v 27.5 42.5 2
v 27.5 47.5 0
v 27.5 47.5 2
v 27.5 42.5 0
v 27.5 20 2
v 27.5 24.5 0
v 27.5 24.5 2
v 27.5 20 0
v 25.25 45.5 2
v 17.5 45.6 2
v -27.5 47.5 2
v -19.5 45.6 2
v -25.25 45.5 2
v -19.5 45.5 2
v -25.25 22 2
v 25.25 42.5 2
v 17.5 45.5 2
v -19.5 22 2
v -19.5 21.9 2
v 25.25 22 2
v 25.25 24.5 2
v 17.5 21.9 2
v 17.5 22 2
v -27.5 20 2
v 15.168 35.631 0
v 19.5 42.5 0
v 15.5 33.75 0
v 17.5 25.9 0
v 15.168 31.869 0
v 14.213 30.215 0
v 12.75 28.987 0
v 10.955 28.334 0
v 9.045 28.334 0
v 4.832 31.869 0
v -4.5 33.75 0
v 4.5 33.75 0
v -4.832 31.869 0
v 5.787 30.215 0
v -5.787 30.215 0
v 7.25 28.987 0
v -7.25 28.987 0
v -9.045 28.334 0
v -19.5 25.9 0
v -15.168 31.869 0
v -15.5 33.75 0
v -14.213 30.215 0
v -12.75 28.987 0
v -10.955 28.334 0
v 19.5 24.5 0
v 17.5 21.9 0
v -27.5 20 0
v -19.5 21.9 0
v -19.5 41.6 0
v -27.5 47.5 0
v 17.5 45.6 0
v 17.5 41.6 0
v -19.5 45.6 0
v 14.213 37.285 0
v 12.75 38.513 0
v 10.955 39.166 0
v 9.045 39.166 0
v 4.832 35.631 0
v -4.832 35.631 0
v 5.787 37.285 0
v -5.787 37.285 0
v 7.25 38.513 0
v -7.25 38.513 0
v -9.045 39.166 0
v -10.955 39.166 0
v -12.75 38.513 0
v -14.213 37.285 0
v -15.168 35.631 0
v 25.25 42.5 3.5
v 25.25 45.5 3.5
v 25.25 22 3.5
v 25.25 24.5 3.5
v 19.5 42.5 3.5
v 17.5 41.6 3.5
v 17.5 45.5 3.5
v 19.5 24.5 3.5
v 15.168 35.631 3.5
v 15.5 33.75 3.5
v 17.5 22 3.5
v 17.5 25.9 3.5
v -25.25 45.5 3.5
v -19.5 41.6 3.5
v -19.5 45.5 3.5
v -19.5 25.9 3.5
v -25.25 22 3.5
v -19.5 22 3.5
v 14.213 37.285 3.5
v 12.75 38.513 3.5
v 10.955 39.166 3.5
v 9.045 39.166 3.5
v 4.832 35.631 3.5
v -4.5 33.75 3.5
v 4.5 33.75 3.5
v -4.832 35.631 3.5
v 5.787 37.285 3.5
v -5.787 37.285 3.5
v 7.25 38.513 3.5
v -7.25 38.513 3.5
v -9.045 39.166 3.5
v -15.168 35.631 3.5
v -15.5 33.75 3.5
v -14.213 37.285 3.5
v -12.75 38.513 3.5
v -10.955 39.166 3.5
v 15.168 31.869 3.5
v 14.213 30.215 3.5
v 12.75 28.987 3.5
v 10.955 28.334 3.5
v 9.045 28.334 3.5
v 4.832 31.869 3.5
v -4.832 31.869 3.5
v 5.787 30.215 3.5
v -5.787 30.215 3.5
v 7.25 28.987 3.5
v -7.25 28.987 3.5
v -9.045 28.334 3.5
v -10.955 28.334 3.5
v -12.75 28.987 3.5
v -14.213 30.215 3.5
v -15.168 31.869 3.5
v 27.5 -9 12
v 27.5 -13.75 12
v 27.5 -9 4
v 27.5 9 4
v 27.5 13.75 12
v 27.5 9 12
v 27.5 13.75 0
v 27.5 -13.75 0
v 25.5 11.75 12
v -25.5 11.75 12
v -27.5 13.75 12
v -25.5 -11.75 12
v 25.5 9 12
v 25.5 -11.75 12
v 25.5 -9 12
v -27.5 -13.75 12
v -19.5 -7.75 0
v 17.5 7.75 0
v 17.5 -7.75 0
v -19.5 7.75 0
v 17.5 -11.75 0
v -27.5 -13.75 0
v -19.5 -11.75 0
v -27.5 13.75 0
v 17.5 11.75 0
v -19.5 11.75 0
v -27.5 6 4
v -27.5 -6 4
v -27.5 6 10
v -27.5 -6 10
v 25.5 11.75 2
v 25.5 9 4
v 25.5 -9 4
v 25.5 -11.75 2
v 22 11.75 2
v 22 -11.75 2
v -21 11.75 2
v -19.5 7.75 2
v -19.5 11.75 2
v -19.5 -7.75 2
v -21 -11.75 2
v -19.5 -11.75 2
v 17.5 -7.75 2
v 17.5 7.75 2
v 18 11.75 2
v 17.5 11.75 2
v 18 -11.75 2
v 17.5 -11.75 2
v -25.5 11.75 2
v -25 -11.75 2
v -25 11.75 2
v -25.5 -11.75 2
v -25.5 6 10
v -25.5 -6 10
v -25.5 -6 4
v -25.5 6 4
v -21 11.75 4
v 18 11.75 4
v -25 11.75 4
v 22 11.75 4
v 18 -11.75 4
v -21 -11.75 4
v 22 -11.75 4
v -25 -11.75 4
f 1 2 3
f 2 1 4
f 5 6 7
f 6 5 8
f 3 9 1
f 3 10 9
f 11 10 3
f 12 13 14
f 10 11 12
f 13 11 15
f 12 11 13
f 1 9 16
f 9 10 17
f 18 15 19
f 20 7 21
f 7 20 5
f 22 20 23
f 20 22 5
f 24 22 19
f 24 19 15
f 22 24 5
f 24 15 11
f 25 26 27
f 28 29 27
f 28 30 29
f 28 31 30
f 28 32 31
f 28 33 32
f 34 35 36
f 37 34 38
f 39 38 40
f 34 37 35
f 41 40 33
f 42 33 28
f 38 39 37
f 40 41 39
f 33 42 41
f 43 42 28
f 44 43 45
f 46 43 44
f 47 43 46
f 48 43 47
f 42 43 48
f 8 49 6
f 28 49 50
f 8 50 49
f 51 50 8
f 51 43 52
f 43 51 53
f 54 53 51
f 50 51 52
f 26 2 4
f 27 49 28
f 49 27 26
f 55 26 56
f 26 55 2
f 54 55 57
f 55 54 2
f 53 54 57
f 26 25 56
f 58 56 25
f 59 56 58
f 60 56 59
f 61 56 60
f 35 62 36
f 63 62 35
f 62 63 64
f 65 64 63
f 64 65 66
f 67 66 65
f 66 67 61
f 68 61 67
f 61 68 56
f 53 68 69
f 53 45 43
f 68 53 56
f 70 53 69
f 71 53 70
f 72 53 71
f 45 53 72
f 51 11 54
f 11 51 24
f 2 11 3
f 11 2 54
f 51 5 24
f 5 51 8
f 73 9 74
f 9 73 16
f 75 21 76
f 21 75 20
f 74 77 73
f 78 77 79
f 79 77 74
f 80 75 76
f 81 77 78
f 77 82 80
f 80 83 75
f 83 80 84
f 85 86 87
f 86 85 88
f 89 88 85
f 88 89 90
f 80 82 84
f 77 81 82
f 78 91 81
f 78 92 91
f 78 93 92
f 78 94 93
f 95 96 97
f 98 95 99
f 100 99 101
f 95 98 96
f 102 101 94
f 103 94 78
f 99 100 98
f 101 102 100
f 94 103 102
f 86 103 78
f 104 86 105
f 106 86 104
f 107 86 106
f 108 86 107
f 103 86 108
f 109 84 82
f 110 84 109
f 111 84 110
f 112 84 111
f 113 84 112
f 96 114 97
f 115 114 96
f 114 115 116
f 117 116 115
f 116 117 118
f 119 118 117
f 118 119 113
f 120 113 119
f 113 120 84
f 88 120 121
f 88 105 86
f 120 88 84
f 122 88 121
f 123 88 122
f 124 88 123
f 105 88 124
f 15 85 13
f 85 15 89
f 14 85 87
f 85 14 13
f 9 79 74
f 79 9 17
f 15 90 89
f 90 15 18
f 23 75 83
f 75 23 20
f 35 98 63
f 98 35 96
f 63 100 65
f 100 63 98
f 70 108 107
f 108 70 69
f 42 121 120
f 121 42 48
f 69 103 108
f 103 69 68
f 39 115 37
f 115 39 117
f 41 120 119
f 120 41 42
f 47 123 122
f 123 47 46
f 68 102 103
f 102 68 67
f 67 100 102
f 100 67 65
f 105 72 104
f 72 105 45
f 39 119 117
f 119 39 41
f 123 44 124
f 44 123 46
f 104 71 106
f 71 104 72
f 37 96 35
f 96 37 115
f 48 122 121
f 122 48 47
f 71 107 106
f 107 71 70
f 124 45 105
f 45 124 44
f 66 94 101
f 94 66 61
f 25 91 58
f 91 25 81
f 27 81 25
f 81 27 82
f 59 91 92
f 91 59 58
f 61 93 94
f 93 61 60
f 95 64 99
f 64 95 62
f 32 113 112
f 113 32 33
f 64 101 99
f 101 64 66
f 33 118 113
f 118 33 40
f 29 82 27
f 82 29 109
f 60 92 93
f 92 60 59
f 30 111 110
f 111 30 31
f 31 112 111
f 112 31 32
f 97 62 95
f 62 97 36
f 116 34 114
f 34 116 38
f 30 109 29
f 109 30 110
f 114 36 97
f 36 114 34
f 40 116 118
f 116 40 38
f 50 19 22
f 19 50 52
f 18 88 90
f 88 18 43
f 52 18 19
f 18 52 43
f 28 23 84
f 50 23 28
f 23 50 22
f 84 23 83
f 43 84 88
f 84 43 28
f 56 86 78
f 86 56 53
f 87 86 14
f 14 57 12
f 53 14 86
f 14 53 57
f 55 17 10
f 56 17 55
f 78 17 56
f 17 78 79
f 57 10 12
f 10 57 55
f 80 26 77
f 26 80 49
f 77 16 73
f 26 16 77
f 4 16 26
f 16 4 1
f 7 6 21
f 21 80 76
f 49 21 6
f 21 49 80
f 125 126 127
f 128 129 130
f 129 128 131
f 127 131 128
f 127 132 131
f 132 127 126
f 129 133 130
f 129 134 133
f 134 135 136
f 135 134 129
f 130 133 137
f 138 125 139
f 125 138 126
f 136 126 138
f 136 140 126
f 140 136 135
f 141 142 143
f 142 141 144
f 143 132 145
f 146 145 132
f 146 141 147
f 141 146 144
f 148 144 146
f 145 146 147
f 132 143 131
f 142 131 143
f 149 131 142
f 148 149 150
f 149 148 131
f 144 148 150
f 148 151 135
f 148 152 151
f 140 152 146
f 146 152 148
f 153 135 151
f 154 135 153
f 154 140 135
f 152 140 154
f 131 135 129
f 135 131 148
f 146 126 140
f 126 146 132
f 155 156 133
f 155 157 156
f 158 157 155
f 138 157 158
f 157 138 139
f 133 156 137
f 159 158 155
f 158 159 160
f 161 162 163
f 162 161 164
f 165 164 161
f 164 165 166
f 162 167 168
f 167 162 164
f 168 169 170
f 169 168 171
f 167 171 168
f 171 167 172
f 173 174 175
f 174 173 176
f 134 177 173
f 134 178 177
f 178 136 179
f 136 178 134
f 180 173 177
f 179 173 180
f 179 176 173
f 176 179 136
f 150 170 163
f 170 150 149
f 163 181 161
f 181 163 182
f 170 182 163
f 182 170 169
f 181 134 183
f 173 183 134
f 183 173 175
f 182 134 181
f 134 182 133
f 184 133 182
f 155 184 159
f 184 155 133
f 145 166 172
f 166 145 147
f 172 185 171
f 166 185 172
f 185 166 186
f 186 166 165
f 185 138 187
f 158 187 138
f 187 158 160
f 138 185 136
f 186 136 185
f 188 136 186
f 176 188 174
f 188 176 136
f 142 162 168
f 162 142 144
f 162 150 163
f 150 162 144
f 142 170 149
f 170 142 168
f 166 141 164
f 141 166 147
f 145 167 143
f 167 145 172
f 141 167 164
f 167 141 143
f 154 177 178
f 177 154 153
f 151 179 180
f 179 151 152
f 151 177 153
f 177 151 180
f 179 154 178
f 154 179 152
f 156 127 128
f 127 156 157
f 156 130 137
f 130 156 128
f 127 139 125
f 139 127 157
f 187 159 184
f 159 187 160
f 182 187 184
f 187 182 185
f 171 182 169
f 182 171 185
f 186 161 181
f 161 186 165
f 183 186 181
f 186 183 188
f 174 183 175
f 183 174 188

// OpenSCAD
height = 12.0;

thickness = 2.0;
fudge = 0.1;

width = 38.5 + 16.5;
depth = 30.50 - 3.0;
 
cavity_width = width - (2 * thickness);
cavity_depth = depth - (2 * thickness);
cavity_height = height - thickness + fudge;

hole_diameter = 5.5;

slit_width = 4.0;
slit_height = 23.0 + 14.0;

// lid
difference() {
    union () {
        translate([-(width / 2.0), 20, 0.0]) cube([width, depth, 2.0]);
        translate([-(cavity_width / 2.0 - 0.25), 22, 2.0]) cube([cavity_width - 0.5, cavity_depth, 1.5]);            
    }
    translate([-10, 22 + (cavity_depth / 2), 2.5]) cylinder(h = 5 + fudge, r1 = hole_diameter, r2 =hole_diameter, center = true);
    translate([10, 22 + (cavity_depth / 2), 2.5]) cylinder(h = 5 + fudge, r1 = hole_diameter, r2 =hole_diameter, center = true);
    rotate([0, 0, 90]) translate([21.9, -17.5, 0]) cube([slit_width, slit_height, 10]);
    rotate([0, 0, 90]) translate([41.6, -17.5, 0]) cube([slit_width, slit_height, 10]);
    rotate([0, 0, 180]) translate([-27.5, -42.5, 0]) cube([8, 18, 10]);
}

// base
union() {
    translate([18, -(cavity_depth / 2.0), 2]) cube([4.0, cavity_depth, 2.0]);
    translate([-25, -(cavity_depth / 2.0), 2]) cube([4.0, cavity_depth, 2.0]);
    difference () {
        translate([0, 0, height / 2.0]) cube([width, depth, height], center = true); 
        translate([0, 0, (cavity_height / 2.0) + thickness]) cube([cavity_width, cavity_depth, cavity_height], center = true);
        rotate([0, 0, 90]) translate([7.75, -17.5, 0]) cube([slit_width, slit_height, 5]);
        rotate([0, 0, 90]) translate([-11.75, -17.5, 0]) cube([slit_width, slit_height, 5]);
        translate([-28, -6, 4]) cube([3, 12, 6]);
        translate([25, -9, 4]) cube([3, 18, 11]);
    }
}
